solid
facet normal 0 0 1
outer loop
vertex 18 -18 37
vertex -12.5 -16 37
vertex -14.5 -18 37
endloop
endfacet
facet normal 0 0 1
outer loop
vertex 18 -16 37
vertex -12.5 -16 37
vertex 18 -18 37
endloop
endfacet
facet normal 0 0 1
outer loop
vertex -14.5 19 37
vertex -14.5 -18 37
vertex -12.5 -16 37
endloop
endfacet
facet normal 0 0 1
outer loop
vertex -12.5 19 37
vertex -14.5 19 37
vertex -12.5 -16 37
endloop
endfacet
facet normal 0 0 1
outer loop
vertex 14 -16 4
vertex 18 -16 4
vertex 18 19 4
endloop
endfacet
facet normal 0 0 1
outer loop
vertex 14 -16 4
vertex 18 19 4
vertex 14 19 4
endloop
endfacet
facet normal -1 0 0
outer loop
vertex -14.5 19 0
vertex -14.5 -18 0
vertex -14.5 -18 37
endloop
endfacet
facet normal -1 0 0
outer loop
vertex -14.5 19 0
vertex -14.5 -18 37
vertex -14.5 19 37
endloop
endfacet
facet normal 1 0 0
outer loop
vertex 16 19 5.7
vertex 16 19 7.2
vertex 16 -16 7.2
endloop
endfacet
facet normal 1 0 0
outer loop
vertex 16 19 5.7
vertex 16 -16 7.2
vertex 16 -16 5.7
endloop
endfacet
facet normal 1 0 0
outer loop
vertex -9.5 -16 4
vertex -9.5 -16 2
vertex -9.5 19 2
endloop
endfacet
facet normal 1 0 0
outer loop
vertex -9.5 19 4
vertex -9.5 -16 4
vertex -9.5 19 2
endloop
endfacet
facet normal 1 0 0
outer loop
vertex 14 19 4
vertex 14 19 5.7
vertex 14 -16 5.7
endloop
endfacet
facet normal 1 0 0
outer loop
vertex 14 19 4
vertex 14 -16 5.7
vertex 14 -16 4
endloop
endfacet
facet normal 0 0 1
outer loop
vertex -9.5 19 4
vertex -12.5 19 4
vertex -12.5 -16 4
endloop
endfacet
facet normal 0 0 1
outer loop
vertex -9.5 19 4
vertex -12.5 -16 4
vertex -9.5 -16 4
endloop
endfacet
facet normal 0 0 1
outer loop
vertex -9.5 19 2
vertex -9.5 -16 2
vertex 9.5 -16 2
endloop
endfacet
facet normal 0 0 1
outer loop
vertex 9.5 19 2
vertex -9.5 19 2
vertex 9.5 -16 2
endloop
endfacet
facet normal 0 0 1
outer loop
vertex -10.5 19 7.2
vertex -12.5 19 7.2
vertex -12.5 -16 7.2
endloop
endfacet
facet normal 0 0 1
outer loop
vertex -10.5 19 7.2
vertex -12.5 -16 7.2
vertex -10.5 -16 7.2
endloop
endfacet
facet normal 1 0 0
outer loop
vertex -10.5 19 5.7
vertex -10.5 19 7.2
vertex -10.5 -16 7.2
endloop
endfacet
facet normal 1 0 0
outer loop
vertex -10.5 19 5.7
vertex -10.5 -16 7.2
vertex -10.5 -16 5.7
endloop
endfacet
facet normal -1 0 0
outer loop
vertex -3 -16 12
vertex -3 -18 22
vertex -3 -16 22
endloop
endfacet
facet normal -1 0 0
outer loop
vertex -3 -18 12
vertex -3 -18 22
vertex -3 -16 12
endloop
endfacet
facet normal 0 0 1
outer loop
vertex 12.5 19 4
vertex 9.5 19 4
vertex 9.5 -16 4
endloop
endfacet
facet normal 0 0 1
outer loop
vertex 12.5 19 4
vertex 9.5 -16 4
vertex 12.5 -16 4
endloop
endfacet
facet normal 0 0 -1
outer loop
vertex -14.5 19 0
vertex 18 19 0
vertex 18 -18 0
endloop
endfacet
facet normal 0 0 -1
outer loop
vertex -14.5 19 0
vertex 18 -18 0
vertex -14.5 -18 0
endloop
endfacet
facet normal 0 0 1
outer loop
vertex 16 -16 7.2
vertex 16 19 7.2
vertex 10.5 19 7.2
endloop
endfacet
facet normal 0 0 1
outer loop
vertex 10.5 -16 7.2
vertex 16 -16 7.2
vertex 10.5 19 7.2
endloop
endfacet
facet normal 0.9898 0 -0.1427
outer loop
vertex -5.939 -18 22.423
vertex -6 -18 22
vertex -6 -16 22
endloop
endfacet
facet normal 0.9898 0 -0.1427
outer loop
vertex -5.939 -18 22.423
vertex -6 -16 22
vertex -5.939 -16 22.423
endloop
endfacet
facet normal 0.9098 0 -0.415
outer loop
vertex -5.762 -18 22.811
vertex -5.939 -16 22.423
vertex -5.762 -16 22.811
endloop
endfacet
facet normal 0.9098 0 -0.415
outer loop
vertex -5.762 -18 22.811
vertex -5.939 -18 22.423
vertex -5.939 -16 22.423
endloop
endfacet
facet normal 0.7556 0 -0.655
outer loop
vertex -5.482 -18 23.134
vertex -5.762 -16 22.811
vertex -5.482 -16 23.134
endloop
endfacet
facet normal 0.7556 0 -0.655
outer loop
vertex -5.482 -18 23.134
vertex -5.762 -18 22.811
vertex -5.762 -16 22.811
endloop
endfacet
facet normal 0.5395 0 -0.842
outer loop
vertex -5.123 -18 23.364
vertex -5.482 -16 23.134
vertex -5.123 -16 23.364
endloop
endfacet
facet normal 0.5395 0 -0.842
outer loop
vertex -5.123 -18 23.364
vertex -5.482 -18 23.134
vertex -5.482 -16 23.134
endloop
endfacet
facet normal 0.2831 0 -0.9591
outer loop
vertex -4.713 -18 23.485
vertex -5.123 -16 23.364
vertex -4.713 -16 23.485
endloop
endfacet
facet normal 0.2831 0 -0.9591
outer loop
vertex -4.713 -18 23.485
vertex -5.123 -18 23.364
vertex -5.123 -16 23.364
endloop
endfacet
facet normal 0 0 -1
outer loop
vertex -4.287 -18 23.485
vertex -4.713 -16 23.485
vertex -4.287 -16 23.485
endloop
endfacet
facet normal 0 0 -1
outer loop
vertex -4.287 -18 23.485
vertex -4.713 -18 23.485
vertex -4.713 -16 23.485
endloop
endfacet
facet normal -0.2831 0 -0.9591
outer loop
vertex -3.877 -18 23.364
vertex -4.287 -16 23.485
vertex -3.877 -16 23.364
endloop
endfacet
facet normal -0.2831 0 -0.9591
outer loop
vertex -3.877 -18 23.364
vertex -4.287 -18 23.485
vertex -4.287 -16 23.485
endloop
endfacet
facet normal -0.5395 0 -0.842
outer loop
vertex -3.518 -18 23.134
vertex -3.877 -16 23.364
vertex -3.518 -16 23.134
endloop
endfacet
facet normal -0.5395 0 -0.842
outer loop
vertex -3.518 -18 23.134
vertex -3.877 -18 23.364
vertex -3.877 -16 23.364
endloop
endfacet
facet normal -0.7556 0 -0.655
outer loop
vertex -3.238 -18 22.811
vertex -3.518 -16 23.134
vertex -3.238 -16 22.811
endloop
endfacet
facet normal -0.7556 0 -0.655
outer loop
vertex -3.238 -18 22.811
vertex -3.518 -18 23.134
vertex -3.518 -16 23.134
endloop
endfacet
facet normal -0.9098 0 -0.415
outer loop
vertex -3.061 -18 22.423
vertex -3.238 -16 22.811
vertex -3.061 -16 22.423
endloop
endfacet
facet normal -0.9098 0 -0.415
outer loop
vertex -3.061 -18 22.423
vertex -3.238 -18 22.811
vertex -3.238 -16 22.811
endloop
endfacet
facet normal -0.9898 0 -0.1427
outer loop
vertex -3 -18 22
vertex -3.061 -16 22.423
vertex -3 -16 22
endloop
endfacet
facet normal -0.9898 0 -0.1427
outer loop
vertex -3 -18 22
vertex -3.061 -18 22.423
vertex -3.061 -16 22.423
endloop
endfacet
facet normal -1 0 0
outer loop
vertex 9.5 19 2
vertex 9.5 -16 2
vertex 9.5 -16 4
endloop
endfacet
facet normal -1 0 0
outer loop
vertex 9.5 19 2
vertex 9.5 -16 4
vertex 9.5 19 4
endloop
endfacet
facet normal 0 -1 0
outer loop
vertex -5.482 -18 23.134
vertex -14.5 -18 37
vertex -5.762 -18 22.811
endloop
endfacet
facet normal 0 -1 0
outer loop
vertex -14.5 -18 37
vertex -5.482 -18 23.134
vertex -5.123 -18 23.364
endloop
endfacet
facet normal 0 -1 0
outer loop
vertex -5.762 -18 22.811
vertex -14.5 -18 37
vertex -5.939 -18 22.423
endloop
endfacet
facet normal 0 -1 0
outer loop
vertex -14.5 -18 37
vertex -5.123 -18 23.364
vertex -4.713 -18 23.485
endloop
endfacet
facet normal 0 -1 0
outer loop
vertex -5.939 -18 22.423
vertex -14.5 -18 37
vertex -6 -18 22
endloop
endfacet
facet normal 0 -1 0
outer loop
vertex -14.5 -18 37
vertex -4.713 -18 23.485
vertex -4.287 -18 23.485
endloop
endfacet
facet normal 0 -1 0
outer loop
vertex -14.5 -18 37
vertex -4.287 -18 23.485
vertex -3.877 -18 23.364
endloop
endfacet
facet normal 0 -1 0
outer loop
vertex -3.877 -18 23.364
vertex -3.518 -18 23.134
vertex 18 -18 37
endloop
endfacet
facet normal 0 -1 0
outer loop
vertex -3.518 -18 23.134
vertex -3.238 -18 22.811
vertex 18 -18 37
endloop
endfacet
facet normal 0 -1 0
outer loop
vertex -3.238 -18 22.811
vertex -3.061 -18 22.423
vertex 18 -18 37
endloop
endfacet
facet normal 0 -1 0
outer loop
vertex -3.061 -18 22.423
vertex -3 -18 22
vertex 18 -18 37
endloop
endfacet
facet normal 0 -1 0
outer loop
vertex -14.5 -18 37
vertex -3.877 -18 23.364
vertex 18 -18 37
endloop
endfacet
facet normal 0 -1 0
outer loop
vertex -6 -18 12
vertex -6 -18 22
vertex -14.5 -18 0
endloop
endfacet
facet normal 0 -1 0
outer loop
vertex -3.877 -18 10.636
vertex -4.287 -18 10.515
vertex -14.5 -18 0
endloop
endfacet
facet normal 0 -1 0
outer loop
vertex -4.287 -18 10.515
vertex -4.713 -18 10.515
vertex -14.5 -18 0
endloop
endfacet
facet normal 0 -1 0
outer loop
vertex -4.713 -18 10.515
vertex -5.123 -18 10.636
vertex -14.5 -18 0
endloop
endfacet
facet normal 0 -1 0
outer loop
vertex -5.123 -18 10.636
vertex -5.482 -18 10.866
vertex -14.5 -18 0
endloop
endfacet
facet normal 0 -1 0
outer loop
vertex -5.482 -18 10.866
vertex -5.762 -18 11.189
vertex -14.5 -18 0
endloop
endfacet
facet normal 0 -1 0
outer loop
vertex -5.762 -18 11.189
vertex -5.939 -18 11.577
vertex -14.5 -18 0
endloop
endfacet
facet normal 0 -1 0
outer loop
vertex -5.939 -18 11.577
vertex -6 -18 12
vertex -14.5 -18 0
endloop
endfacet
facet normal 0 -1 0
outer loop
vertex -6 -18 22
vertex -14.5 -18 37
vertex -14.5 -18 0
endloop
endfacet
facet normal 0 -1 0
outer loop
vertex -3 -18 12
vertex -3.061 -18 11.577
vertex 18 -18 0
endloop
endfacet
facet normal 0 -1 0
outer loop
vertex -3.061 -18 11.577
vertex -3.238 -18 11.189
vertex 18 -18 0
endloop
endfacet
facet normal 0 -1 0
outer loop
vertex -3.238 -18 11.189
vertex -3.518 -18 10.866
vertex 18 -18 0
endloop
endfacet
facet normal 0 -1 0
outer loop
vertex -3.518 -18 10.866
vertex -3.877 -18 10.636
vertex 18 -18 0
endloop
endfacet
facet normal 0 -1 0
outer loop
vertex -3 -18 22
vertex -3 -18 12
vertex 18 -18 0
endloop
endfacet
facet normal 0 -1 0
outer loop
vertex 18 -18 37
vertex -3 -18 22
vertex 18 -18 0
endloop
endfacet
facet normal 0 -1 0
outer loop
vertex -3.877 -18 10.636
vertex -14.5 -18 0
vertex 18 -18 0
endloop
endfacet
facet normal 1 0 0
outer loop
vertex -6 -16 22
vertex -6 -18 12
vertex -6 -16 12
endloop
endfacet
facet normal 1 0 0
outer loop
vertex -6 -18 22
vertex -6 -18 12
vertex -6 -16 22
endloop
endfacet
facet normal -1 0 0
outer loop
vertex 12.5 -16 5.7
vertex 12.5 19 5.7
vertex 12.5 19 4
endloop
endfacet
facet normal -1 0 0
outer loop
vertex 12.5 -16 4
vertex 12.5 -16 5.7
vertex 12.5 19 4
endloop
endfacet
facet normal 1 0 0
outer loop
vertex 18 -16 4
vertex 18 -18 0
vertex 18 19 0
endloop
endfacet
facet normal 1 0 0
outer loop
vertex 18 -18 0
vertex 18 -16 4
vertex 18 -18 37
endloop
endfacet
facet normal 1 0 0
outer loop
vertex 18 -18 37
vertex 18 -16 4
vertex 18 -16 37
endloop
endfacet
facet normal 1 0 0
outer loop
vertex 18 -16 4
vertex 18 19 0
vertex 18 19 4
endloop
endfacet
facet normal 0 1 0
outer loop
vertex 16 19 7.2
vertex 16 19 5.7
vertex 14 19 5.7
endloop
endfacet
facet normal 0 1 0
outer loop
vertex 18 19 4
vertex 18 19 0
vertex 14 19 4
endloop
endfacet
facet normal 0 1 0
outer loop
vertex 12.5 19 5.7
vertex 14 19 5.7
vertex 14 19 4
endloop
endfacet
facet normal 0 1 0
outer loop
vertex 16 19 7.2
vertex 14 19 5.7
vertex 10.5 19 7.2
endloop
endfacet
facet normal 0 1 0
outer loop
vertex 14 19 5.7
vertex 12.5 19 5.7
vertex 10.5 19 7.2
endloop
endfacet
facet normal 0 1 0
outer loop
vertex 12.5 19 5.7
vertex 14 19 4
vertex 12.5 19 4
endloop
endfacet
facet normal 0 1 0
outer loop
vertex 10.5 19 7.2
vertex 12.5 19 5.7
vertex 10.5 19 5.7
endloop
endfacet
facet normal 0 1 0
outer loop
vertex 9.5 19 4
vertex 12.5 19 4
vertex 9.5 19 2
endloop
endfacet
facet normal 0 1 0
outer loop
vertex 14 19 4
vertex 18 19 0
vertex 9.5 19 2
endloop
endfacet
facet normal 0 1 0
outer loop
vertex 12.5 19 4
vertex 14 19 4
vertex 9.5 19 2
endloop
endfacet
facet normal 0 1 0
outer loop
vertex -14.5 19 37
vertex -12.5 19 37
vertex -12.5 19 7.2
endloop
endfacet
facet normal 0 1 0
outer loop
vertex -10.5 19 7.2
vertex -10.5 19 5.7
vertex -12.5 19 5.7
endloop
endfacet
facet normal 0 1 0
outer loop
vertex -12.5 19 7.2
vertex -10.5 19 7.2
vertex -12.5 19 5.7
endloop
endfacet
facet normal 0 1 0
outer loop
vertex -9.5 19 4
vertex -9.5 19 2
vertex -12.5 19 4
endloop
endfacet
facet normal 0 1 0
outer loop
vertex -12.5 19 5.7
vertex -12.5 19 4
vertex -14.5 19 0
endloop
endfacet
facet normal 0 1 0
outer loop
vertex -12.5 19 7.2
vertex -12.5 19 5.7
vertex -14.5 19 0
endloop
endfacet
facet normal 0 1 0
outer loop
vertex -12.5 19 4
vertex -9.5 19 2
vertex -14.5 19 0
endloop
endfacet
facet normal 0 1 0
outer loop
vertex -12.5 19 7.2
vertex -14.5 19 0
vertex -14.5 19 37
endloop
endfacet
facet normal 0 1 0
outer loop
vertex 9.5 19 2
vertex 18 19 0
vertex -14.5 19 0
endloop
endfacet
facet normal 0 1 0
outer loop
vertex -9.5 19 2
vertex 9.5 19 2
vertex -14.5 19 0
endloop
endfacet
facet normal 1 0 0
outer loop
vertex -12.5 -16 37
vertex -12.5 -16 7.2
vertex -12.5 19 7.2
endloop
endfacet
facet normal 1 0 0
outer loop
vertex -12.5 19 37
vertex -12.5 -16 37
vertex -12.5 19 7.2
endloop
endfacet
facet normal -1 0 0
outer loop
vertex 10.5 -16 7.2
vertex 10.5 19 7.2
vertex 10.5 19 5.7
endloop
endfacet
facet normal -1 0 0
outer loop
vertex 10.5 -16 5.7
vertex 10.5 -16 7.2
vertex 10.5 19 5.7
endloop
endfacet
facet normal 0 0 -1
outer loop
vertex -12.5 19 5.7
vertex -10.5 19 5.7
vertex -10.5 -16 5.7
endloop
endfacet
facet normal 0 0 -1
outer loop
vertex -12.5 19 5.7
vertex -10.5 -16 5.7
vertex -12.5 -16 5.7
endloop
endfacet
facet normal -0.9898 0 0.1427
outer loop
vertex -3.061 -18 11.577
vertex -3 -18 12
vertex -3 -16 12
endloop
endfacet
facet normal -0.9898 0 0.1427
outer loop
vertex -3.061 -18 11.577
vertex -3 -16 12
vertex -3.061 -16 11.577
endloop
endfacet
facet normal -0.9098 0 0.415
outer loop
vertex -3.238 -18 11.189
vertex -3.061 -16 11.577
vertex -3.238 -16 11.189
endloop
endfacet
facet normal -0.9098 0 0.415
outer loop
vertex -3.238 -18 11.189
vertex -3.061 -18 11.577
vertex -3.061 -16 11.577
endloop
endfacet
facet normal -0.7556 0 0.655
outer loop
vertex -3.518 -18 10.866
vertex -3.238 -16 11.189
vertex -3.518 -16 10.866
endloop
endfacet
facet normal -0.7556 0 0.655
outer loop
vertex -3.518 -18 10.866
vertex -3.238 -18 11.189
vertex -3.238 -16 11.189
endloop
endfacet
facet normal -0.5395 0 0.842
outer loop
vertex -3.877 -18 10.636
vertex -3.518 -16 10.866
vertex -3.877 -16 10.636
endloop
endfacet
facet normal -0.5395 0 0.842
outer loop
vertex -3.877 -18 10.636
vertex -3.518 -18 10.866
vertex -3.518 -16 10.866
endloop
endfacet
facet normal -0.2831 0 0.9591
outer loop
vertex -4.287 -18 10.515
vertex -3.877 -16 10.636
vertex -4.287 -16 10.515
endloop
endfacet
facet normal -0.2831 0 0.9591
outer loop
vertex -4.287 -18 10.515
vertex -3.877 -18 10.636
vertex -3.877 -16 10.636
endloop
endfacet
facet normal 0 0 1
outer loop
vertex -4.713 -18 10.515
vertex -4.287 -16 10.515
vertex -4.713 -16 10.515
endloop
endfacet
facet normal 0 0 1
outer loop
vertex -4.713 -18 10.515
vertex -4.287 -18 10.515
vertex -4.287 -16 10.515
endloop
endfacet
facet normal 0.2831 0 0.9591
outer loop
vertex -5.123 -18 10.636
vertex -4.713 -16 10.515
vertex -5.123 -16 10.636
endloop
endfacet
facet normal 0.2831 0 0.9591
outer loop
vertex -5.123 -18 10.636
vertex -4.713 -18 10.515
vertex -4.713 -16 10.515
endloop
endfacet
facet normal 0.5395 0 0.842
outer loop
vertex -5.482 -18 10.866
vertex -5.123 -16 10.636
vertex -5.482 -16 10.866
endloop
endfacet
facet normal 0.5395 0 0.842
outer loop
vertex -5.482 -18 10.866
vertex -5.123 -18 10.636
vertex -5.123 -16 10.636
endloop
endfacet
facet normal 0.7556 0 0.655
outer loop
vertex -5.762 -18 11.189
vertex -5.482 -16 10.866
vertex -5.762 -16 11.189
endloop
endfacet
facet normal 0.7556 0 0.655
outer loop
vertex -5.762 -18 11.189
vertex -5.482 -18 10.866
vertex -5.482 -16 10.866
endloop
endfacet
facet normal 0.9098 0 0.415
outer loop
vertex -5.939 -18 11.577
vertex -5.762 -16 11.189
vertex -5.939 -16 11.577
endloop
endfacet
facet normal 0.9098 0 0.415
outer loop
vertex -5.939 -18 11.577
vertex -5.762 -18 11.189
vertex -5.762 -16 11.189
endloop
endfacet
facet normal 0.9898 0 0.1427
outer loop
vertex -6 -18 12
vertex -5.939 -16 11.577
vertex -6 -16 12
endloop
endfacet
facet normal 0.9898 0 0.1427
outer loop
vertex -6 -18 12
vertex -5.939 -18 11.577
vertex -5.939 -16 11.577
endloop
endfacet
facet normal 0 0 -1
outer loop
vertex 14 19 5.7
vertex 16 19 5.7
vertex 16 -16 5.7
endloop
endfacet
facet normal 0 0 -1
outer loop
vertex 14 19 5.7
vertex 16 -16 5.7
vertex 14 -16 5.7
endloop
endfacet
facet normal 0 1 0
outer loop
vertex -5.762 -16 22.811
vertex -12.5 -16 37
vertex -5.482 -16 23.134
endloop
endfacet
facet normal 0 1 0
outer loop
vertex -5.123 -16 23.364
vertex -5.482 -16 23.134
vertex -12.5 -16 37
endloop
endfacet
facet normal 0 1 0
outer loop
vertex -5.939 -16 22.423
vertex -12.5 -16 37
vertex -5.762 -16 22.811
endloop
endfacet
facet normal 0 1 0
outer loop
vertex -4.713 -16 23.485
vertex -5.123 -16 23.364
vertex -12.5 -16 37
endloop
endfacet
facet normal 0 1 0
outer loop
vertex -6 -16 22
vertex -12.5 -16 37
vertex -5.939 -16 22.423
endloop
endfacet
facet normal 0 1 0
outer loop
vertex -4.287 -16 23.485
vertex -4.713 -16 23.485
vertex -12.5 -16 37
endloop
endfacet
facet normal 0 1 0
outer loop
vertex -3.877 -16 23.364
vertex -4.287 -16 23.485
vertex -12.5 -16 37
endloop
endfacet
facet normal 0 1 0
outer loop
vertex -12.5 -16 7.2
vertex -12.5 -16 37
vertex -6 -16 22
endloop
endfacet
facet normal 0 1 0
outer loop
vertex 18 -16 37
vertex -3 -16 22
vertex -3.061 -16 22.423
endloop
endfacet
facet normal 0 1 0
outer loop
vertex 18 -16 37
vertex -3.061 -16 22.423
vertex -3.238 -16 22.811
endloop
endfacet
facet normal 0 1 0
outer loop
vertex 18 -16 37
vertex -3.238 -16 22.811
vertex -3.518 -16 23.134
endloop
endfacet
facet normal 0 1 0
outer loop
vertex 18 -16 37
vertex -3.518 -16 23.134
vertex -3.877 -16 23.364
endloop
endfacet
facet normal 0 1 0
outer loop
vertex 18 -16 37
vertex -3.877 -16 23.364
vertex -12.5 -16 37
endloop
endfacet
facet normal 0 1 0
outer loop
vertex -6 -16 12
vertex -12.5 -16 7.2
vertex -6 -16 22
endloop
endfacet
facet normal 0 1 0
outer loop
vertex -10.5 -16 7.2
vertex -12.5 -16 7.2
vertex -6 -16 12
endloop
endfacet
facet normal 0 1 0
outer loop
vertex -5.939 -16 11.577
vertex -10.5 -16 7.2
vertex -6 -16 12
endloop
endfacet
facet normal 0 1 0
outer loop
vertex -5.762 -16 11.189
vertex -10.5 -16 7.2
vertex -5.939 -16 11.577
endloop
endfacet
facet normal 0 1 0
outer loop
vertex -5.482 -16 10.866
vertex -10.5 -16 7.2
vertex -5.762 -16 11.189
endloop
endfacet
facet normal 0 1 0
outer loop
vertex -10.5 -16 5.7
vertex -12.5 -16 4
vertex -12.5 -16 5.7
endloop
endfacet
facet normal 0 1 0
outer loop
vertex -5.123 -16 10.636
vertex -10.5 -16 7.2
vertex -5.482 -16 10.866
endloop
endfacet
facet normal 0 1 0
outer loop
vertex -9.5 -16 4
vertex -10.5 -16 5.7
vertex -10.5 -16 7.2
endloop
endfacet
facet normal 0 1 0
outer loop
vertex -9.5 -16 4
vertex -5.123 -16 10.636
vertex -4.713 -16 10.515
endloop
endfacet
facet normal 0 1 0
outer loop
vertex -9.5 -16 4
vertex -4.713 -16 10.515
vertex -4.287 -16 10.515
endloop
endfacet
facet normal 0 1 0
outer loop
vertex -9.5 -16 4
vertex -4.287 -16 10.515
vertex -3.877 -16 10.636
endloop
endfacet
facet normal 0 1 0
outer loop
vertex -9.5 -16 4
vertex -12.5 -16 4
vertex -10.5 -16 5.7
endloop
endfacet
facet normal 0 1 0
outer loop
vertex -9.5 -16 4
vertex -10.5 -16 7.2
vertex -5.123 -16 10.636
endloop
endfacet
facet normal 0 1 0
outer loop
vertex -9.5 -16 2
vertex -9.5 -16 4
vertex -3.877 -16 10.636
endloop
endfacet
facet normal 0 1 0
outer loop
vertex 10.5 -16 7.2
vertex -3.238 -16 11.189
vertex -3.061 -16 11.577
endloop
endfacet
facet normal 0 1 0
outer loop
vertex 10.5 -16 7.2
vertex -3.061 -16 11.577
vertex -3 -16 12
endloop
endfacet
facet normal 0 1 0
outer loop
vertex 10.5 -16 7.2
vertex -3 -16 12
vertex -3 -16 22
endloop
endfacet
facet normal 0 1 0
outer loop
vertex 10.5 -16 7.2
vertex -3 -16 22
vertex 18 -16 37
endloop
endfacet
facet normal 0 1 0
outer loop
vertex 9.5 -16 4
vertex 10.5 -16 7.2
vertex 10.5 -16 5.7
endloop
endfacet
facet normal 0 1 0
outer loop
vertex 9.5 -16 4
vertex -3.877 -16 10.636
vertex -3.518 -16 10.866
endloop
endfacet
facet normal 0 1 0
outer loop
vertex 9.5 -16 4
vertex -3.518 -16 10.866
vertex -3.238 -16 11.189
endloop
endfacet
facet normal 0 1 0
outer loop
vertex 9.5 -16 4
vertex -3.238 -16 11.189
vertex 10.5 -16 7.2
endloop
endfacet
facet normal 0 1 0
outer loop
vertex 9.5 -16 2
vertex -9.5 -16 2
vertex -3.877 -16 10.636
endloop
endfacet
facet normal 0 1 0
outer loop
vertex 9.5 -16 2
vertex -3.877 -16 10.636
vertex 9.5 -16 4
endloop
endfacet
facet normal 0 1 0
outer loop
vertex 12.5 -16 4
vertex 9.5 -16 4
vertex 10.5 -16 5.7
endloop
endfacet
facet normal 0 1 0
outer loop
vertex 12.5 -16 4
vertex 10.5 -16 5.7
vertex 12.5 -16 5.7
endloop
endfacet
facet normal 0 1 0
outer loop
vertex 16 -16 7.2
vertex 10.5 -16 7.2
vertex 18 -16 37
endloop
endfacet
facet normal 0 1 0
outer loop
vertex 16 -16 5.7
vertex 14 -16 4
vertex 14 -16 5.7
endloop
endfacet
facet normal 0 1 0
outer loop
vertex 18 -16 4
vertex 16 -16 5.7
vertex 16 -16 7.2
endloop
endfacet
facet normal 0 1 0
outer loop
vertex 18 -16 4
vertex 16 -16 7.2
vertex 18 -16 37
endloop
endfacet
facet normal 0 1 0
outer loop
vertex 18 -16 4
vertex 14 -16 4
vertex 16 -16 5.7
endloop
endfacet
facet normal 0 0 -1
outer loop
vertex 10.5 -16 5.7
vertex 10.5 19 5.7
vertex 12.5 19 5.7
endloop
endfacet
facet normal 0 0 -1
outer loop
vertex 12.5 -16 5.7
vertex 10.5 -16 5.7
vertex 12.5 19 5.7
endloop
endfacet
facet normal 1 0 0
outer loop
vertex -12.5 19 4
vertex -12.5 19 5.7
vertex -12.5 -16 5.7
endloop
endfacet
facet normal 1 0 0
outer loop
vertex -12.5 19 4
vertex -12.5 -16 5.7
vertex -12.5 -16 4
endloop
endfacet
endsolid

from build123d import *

# Parameters (mm, degrees)
SKETCH1_W           = 29
SKETCH1_H           = 35
BOSS_EXTRUDE1_DEPTH = 2
SKETCH4_W           = 3
SKETCH4_H           = 35
BOSS_EXTRUDE3_DEPTH = 2
SKETCH5_W           = 3.5
SKETCH5_H           = 1.5
SKETCH5_W_2         = 1.5
SKETCH5_H_2         = 3.7
BOSS_EXTRUDE4_DEPTH = 35
SKETCH6_W           = 2
SKETCH6_H           = 35
BOSS_EXTRUDE5_DEPTH = 35
SKETCH7_W           = 32.5
SKETCH7_H           = 2
BOSS_EXTRUDE6_DEPTH = 37
CUT_EXTRUDE1_DEPTH  = 38
SKETCH11_W          = 2
SKETCH11_H          = 1.5
SKETCH11_W_2        = 3
SKETCH11_H_2        = 2
BOSS_EXTRUDE7_DEPTH = 35
SKETCH12_W          = 3.5
SKETCH12_H          = 2
SKETCH12_W_2        = 1
BOSS_EXTRUDE8_DEPTH = 35


with BuildPart() as part:
    # Sketch1 → Boss-Extrude1 (new body)
    with BuildSketch(Plane.XY):
        with Locations((0, 1.5)):
            Rectangle(SKETCH1_W, SKETCH1_H)
    extrude(amount=BOSS_EXTRUDE1_DEPTH)

    # Sketch4 → Boss-Extrude3 (add)
    with BuildSketch(Plane.XY.offset(2)):
        with Locations((-11, 1.5)):
            Rectangle(SKETCH4_W, SKETCH4_H)
        with Locations((11, 1.5)):
            Rectangle(SKETCH4_W, SKETCH4_H)
    extrude(amount=BOSS_EXTRUDE3_DEPTH)

    # Sketch5 → Boss-Extrude4 (add, through all)
    with BuildSketch(Plane(origin=(0, 19, 0), x_dir=(1, 0, 0), z_dir=(0, 1, 0))):
        Polygon((-12.5, -5.7), (-14, -5.7), (-14, -7.2), (-10.5, -7.2), (-10.5, -5.7), align=None)
        Polygon((-12.5, -4), (-12.5, -2), (-14, -2), (-14, -5.7), (-12.5, -5.7), align=None)
        with Locations((12.25, -6.45)):
            Rectangle(SKETCH5_W, SKETCH5_H)
        with Locations((13.25, -3.85)):
            Rectangle(SKETCH5_W_2, SKETCH5_H_2)
    extrude(amount=-BOSS_EXTRUDE4_DEPTH)

    # Sketch6 → Boss-Extrude5 (add)
    with BuildSketch(Plane.XY.offset(2)):
        with Locations((-13.5, 1.5)):
            Rectangle(SKETCH6_W, SKETCH6_H)
    extrude(amount=BOSS_EXTRUDE5_DEPTH)

    # Sketch7 → Boss-Extrude6 (add)
    with BuildSketch(Plane.XY):
        with Locations((1.75, -17)):
            Rectangle(SKETCH7_W, SKETCH7_H)
    extrude(amount=BOSS_EXTRUDE6_DEPTH)

    # Sketch8 → Cut-Extrude1 (cut, through all)
    with BuildSketch(Plane(origin=(0, -18, 0), x_dir=(-1, 0, 0), z_dir=(0, -1, 0))):
        with BuildLine():
            Line((6, -12), (6, -22))
            ThreePointArc((6, -22), (4.5, -23.5), (3, -22))
            Line((3, -22), (3, -12))
            ThreePointArc((3, -12), (4.5, -10.5), (6, -12))
        make_face()
    extrude(amount=-CUT_EXTRUDE1_DEPTH, mode=Mode.SUBTRACT)

    # Sketch11 → Boss-Extrude7 (add)
    with BuildSketch(Plane(origin=(0, 19, 0), x_dir=(-1, 0, 0), z_dir=(0, -1, 0))):
        with Locations((-15, -6.45)):
            Rectangle(SKETCH11_W, SKETCH11_H)
        with Locations((-15.5, -3)):
            Rectangle(SKETCH11_W_2, SKETCH11_H_2)
    extrude(amount=BOSS_EXTRUDE7_DEPTH)

    # Sketch12 → Boss-Extrude8 (add)
    with BuildSketch(Plane(origin=(0, 19, 0), x_dir=(-1, 0, 0), z_dir=(0, -1, 0))):
        with Locations((-16.25, -1)):
            Rectangle(SKETCH12_W, SKETCH12_H)
        with Locations((-17.5, -3)):
            Rectangle(SKETCH12_W_2, SKETCH12_H)
    extrude(amount=BOSS_EXTRUDE8_DEPTH)


solid = part.part
